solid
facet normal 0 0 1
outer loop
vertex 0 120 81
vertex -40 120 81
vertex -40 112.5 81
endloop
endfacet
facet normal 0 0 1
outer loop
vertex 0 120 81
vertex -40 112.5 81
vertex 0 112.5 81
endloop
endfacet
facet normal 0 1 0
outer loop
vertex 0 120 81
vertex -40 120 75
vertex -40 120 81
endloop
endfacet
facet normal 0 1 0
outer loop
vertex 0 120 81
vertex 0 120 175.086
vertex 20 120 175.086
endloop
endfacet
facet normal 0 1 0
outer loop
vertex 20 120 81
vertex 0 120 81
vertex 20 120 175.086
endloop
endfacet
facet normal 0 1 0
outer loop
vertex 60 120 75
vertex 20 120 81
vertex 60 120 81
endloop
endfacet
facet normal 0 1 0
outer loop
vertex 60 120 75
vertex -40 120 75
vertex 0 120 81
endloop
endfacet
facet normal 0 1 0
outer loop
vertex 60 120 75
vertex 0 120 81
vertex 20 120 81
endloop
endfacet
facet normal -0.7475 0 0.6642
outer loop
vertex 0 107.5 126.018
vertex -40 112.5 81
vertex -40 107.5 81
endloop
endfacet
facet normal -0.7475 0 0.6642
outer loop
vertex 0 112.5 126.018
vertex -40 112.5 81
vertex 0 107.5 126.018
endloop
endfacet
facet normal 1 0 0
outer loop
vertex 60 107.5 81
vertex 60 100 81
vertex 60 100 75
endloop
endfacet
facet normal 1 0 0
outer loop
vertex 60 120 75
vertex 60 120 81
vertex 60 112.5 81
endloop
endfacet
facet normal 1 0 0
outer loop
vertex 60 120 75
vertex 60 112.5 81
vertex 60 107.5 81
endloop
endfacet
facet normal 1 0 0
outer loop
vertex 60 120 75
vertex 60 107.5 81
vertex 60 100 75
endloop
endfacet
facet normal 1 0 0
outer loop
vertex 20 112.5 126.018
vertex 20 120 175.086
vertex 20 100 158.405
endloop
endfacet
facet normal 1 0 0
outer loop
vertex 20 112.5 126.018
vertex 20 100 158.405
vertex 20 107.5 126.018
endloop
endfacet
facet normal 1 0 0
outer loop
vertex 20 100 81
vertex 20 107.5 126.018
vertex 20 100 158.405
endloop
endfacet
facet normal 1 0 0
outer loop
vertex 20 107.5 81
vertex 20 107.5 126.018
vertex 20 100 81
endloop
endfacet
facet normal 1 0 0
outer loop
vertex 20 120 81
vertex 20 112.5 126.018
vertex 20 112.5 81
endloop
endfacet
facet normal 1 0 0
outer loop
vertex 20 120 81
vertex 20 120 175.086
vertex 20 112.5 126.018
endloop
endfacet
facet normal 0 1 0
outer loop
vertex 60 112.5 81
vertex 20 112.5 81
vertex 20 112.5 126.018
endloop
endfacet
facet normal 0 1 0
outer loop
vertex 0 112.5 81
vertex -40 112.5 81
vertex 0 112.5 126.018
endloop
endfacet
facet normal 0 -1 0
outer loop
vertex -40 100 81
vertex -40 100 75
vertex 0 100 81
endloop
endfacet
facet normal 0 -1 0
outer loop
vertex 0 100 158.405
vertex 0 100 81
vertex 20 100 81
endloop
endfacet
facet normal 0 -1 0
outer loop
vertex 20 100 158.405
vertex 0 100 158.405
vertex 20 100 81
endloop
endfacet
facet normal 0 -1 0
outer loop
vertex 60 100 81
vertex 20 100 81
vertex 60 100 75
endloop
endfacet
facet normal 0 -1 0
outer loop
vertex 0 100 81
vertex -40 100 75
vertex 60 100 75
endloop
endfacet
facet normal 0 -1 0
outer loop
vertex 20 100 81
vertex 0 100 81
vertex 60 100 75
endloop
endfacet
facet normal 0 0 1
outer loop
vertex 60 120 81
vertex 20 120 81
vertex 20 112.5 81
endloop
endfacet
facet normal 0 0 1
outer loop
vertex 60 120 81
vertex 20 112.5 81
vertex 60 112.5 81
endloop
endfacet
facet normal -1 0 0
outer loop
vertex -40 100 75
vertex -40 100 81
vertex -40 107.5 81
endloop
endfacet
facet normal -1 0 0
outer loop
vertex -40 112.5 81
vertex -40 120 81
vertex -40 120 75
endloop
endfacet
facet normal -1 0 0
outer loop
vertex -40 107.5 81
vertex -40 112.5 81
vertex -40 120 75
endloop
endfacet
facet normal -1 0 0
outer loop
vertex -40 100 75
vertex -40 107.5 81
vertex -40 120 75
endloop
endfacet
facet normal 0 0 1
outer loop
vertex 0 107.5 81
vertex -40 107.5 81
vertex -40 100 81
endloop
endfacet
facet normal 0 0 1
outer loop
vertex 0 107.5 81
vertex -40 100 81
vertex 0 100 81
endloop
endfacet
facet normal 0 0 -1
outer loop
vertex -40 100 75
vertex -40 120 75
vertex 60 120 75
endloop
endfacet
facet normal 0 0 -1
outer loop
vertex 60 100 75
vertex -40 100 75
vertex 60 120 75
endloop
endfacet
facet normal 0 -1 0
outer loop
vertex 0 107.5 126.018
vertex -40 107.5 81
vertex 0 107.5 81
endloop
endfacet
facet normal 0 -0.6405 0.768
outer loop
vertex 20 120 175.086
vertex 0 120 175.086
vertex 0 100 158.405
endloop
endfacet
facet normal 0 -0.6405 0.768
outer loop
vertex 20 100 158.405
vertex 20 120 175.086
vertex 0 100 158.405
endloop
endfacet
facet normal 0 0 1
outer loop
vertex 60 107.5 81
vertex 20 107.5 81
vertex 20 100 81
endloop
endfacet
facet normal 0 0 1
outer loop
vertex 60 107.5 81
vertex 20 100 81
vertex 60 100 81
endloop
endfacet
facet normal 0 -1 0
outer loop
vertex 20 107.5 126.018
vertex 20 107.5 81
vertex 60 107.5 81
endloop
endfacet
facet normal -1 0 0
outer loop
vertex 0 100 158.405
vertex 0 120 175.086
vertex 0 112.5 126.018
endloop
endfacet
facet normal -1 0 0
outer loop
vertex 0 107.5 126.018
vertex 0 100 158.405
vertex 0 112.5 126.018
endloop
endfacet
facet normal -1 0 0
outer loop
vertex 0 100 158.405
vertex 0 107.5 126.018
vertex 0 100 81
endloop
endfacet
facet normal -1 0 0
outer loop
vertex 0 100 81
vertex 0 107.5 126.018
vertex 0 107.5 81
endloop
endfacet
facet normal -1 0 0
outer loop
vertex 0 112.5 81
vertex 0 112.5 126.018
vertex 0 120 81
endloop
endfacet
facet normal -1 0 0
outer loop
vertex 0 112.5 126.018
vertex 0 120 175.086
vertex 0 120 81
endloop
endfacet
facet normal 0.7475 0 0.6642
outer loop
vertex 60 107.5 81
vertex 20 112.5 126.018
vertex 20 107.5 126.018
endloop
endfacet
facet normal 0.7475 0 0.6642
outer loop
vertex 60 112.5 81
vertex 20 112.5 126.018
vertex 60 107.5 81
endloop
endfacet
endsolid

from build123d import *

# Parameters (mm, degrees)
AUFSATZ_LINEAR_AUSTRAGEN1_DEPTH = 20
SKIZZE2_W                       = 100
SKIZZE2_H                       = 6
AUFSATZ_LINEAR_AUSTRAGEN2_DEPTH = 20
AUFSATZ_LINEAR_AUSTRAGEN3_DEPTH = 2.5


with BuildPart() as part:
    # Skizze1 → Aufsatz-Linear austragen1 (new body)
    with BuildSketch(Plane.ZY):
        Polygon((75, 100), (75, 120), (175.086059804, 120), (158.405049837, 100), align=None)
    extrude(amount=-AUFSATZ_LINEAR_AUSTRAGEN1_DEPTH)

    # Skizze2 → Aufsatz-Linear austragen2 (add)
    with BuildSketch(Plane(origin=(0, 120, 0), x_dir=(1, 0, 0), z_dir=(0, 1, 0))):
        with Locations((10, -78)):
            Rectangle(SKIZZE2_W, SKIZZE2_H)
    extrude(amount=-AUFSATZ_LINEAR_AUSTRAGEN2_DEPTH)

    # Skizze3 → Aufsatz-Linear austragen3 (add, symmetric)
    with BuildSketch(Plane(origin=(0, 110, 0), x_dir=(1, 0, 0), z_dir=(0, 1, 0))):
        Polygon((-40, -81), (0, -126.018077963), (20, -126.018077963), (60, -81), align=None)
    extrude(amount=AUFSATZ_LINEAR_AUSTRAGEN3_DEPTH, both=True)


solid = part.part
